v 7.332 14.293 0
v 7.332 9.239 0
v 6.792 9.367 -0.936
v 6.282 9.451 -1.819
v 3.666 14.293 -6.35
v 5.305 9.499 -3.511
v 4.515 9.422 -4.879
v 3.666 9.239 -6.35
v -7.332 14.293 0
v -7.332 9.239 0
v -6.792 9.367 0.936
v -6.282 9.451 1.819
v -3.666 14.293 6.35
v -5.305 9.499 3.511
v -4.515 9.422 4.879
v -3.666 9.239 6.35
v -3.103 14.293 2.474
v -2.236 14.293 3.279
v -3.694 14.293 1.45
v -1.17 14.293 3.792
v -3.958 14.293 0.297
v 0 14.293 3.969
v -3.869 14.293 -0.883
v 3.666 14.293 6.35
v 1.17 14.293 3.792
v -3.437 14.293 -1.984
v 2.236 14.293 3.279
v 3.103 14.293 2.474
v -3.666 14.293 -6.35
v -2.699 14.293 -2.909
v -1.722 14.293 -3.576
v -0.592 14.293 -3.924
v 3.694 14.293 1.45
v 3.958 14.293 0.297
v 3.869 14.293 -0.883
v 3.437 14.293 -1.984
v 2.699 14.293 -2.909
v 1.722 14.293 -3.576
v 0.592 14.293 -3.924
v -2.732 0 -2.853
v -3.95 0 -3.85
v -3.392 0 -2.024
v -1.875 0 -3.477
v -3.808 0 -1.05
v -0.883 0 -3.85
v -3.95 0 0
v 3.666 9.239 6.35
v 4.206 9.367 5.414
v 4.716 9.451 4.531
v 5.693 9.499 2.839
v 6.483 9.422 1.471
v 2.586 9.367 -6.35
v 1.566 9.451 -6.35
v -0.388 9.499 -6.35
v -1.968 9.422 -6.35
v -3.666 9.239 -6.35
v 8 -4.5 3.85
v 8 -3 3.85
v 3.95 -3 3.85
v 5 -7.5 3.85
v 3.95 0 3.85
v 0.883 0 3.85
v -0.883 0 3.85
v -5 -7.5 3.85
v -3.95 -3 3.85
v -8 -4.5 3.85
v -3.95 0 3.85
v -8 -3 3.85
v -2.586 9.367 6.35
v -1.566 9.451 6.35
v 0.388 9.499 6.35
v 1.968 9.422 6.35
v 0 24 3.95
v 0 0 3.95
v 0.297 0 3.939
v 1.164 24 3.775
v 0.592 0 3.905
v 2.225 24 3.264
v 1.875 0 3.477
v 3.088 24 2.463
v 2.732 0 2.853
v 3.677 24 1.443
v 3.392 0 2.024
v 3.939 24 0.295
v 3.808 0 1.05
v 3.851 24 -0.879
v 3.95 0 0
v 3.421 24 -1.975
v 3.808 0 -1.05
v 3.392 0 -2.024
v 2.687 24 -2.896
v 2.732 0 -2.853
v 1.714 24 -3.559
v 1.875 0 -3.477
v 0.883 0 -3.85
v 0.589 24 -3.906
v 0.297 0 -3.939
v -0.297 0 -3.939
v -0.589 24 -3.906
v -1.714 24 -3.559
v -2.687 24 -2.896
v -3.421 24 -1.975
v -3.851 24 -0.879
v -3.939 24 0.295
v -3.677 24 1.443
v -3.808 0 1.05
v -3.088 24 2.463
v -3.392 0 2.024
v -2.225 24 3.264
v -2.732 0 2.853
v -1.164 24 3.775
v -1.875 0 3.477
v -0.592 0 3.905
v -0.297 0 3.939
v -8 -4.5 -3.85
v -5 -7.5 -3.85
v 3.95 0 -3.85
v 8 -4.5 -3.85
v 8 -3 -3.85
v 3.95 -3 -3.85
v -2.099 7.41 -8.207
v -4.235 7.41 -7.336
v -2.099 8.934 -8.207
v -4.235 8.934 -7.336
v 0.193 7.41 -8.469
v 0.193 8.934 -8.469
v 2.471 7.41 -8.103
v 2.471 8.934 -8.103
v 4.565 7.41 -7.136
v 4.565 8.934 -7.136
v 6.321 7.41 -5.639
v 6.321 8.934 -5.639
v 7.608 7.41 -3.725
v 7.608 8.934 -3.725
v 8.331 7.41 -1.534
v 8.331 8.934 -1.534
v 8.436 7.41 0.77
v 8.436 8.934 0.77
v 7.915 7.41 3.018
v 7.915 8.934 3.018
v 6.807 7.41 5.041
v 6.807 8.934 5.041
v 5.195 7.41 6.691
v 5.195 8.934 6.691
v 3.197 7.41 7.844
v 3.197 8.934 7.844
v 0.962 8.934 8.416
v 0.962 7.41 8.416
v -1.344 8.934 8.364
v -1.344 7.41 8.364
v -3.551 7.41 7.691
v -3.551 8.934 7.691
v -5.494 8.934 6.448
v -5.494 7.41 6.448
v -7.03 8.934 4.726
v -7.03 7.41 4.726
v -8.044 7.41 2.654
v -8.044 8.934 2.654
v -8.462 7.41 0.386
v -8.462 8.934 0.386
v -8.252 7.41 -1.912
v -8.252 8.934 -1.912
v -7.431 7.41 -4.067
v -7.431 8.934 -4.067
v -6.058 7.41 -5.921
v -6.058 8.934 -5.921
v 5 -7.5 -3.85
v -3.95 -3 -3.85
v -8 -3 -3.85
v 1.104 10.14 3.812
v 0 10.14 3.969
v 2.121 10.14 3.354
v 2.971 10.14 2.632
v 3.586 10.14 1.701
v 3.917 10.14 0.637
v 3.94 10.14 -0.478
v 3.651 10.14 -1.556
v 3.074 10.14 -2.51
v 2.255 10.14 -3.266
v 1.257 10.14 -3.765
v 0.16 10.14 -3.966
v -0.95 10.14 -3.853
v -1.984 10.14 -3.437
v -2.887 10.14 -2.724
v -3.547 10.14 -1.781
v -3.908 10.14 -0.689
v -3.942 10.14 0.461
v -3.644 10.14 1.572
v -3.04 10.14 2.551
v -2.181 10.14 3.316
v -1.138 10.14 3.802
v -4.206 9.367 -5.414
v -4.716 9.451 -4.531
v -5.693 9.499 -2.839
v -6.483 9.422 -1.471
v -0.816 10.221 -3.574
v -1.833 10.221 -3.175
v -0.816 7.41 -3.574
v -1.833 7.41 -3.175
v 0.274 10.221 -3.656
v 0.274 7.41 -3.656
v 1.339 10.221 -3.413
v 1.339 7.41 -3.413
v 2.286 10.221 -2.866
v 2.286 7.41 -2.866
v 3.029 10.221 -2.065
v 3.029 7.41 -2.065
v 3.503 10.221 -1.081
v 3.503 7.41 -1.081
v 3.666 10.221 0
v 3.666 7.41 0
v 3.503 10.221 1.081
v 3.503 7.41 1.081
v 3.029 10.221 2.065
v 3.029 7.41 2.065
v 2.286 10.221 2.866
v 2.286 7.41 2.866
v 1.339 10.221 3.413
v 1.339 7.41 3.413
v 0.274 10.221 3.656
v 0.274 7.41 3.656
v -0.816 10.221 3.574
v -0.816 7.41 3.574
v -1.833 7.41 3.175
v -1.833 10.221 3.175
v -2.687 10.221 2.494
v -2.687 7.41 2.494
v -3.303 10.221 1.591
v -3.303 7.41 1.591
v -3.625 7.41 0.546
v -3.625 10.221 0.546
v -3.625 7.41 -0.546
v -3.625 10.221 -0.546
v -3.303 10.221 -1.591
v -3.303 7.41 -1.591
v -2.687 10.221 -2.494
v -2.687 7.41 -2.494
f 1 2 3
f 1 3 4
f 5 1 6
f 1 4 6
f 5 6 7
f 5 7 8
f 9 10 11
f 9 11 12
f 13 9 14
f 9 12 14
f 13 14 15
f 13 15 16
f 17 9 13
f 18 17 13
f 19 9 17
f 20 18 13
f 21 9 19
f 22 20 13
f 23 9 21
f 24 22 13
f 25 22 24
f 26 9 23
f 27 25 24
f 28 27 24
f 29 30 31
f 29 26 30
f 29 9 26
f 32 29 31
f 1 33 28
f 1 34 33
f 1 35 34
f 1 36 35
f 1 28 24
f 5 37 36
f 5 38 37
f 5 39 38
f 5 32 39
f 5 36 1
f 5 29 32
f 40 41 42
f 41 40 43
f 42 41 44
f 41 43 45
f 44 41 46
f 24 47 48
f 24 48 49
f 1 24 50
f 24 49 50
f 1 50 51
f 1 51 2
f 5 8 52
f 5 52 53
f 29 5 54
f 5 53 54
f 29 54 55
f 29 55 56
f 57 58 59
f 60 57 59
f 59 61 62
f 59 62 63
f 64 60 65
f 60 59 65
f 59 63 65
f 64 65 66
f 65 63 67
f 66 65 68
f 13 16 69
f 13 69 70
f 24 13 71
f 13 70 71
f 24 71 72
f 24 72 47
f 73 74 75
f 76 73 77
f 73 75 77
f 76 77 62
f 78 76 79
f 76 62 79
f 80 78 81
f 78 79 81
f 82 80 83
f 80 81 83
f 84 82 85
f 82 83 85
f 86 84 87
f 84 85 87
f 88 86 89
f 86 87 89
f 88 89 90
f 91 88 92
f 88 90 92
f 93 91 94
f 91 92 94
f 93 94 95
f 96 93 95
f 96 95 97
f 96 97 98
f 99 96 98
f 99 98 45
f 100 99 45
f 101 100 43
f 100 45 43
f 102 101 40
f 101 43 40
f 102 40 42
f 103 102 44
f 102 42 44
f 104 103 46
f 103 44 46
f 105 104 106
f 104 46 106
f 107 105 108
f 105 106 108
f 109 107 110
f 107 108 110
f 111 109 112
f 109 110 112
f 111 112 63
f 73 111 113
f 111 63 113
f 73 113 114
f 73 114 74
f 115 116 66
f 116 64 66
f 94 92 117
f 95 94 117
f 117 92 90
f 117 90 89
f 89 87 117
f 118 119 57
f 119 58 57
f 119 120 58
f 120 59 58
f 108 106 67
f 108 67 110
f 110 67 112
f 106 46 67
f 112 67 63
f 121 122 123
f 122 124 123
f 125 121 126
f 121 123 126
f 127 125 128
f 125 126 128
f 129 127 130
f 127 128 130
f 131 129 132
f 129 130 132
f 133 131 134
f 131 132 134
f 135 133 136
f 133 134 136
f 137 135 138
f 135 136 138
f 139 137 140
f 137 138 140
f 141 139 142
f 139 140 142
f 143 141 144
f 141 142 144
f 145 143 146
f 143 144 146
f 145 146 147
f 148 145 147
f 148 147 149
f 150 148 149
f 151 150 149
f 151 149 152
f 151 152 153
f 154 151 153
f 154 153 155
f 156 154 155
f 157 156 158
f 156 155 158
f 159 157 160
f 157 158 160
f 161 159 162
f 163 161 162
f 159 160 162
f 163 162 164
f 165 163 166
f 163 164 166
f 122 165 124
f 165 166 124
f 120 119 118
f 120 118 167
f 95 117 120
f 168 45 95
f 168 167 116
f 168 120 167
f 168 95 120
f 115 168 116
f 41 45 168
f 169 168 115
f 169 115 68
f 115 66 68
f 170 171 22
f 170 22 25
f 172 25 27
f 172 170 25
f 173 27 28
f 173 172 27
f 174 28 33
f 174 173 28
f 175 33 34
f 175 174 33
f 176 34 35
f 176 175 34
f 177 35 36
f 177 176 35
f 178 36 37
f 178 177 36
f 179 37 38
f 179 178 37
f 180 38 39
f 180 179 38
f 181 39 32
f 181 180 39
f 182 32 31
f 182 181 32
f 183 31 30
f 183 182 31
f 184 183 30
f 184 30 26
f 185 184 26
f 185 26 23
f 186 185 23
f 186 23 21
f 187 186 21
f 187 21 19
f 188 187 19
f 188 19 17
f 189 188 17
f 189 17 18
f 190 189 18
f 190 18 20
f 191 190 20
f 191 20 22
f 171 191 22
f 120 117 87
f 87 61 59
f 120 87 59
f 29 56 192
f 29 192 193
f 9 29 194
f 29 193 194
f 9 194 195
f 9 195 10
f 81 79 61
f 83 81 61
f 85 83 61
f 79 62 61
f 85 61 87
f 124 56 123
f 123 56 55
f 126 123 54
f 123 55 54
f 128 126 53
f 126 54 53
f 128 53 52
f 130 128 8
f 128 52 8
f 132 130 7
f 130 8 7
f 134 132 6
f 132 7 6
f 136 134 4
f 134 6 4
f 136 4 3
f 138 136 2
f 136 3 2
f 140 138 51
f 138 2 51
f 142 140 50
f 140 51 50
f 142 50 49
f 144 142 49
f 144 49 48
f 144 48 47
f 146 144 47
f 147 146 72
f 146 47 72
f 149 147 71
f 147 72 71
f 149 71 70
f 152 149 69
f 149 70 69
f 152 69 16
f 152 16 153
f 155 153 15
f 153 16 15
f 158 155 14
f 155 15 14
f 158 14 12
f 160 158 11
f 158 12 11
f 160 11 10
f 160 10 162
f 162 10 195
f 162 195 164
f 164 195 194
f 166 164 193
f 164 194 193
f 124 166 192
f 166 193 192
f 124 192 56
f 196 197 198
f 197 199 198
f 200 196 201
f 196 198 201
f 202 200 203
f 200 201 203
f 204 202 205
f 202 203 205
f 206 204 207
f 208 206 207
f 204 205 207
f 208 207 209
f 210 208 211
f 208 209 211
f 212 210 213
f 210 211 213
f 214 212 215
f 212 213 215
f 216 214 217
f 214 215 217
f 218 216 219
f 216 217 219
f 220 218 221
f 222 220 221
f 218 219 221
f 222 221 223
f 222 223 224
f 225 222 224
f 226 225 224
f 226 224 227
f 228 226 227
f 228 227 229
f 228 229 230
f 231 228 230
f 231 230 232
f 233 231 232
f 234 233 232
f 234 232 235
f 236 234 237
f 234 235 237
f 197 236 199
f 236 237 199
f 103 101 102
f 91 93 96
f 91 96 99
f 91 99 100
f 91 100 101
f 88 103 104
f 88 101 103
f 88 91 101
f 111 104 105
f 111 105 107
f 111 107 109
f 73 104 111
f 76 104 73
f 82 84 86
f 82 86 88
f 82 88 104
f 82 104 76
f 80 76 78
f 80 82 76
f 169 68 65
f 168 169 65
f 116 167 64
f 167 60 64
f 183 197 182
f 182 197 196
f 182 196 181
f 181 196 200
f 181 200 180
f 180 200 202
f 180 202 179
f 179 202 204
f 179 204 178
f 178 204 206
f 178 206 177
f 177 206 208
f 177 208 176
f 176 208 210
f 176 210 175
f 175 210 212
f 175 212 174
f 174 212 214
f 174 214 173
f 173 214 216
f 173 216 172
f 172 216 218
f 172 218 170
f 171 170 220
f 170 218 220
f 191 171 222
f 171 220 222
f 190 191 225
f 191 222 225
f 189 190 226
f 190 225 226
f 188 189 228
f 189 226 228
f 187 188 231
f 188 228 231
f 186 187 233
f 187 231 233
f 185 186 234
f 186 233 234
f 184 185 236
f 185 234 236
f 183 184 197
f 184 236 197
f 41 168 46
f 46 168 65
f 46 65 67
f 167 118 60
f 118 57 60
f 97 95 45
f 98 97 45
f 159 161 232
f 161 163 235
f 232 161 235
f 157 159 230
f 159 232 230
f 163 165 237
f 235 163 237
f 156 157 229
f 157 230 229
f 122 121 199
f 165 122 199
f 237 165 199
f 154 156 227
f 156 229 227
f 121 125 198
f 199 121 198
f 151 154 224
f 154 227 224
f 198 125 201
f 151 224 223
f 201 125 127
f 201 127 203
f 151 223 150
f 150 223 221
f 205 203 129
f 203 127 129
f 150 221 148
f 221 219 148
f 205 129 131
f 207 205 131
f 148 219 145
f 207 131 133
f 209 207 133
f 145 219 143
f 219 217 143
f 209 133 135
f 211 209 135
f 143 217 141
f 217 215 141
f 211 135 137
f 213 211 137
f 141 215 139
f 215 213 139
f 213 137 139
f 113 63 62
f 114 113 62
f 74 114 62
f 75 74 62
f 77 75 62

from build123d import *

# Parameters (mm, degrees)
SKETCH1_R           = 3.95
BOSS_EXTRUDE1_DEPTH = 24
BOSS_EXTRUDE2_DEPTH = 3.85
BOSS_EXTRUDE3_START = 7.41
SKETCH8_R           = 3.96875
BOSS_EXTRUDE3_DEPTH = 6.8834


with BuildPart() as part:
    # Sketch1 → Boss-Extrude1 (new body)
    with BuildSketch(Plane(origin=(0, 0, 0), x_dir=(1, 0, 0), z_dir=(0, 1, 0))):
        with Locations(Location((0, 0, 0), (0, 0, 270))):
            Circle(SKETCH1_R)
    extrude(amount=BOSS_EXTRUDE1_DEPTH)

    # Sketch5 → Boss-Extrude2 (add, symmetric)
    with BuildSketch(Plane.XY):
        Polygon((-3.949999974, 0), (3.949999974, 0), (3.949999974, -3), (8, -3), (8, -4.5), (5, -7.5), (-5, -7.5), (-8, -4.5), (-8, -3), (-3.949999974, -3), align=None)
    extrude(amount=BOSS_EXTRUDE2_DEPTH, both=True)


with BuildPart() as body_2:
    # Sketch8 → Boss-Extrude3 (new body)
    with BuildSketch(Plane(origin=(0, 0, 0), x_dir=(1, 0, 0), z_dir=(0, 1, 0)).offset(BOSS_EXTRUDE3_START)):
        Polygon((7.332348419, 0), (3.666174209, 6.35), (-3.666174209, 6.35), (-7.332348419, 0), (-3.666174209, -6.35), (3.666174209, -6.35), align=None)
        with Locations(Location((0, 0, 0), (0, 0, 270))):
            Circle(SKETCH8_R, mode=Mode.SUBTRACT)
    extrude(amount=BOSS_EXTRUDE3_DEPTH)

    # Sketch10 → Revolve1 (revolve)
    with BuildSketch(Plane.XY, mode=Mode.PRIVATE) as revolve1_sk:
        Polygon((-3.666174209, 7.41), (-8.4709, 7.41), (-8.4709, 8.934), (-3.666174209, 10.221422395), align=None)
    revolve(revolve1_sk.sketch.rotate(Axis((0, 24, 0), (0, -1, 0)), 60.00000001), axis=Axis((0, 24, 0), (0, -1, 0)))


solid = Compound([part.part, body_2.part])
